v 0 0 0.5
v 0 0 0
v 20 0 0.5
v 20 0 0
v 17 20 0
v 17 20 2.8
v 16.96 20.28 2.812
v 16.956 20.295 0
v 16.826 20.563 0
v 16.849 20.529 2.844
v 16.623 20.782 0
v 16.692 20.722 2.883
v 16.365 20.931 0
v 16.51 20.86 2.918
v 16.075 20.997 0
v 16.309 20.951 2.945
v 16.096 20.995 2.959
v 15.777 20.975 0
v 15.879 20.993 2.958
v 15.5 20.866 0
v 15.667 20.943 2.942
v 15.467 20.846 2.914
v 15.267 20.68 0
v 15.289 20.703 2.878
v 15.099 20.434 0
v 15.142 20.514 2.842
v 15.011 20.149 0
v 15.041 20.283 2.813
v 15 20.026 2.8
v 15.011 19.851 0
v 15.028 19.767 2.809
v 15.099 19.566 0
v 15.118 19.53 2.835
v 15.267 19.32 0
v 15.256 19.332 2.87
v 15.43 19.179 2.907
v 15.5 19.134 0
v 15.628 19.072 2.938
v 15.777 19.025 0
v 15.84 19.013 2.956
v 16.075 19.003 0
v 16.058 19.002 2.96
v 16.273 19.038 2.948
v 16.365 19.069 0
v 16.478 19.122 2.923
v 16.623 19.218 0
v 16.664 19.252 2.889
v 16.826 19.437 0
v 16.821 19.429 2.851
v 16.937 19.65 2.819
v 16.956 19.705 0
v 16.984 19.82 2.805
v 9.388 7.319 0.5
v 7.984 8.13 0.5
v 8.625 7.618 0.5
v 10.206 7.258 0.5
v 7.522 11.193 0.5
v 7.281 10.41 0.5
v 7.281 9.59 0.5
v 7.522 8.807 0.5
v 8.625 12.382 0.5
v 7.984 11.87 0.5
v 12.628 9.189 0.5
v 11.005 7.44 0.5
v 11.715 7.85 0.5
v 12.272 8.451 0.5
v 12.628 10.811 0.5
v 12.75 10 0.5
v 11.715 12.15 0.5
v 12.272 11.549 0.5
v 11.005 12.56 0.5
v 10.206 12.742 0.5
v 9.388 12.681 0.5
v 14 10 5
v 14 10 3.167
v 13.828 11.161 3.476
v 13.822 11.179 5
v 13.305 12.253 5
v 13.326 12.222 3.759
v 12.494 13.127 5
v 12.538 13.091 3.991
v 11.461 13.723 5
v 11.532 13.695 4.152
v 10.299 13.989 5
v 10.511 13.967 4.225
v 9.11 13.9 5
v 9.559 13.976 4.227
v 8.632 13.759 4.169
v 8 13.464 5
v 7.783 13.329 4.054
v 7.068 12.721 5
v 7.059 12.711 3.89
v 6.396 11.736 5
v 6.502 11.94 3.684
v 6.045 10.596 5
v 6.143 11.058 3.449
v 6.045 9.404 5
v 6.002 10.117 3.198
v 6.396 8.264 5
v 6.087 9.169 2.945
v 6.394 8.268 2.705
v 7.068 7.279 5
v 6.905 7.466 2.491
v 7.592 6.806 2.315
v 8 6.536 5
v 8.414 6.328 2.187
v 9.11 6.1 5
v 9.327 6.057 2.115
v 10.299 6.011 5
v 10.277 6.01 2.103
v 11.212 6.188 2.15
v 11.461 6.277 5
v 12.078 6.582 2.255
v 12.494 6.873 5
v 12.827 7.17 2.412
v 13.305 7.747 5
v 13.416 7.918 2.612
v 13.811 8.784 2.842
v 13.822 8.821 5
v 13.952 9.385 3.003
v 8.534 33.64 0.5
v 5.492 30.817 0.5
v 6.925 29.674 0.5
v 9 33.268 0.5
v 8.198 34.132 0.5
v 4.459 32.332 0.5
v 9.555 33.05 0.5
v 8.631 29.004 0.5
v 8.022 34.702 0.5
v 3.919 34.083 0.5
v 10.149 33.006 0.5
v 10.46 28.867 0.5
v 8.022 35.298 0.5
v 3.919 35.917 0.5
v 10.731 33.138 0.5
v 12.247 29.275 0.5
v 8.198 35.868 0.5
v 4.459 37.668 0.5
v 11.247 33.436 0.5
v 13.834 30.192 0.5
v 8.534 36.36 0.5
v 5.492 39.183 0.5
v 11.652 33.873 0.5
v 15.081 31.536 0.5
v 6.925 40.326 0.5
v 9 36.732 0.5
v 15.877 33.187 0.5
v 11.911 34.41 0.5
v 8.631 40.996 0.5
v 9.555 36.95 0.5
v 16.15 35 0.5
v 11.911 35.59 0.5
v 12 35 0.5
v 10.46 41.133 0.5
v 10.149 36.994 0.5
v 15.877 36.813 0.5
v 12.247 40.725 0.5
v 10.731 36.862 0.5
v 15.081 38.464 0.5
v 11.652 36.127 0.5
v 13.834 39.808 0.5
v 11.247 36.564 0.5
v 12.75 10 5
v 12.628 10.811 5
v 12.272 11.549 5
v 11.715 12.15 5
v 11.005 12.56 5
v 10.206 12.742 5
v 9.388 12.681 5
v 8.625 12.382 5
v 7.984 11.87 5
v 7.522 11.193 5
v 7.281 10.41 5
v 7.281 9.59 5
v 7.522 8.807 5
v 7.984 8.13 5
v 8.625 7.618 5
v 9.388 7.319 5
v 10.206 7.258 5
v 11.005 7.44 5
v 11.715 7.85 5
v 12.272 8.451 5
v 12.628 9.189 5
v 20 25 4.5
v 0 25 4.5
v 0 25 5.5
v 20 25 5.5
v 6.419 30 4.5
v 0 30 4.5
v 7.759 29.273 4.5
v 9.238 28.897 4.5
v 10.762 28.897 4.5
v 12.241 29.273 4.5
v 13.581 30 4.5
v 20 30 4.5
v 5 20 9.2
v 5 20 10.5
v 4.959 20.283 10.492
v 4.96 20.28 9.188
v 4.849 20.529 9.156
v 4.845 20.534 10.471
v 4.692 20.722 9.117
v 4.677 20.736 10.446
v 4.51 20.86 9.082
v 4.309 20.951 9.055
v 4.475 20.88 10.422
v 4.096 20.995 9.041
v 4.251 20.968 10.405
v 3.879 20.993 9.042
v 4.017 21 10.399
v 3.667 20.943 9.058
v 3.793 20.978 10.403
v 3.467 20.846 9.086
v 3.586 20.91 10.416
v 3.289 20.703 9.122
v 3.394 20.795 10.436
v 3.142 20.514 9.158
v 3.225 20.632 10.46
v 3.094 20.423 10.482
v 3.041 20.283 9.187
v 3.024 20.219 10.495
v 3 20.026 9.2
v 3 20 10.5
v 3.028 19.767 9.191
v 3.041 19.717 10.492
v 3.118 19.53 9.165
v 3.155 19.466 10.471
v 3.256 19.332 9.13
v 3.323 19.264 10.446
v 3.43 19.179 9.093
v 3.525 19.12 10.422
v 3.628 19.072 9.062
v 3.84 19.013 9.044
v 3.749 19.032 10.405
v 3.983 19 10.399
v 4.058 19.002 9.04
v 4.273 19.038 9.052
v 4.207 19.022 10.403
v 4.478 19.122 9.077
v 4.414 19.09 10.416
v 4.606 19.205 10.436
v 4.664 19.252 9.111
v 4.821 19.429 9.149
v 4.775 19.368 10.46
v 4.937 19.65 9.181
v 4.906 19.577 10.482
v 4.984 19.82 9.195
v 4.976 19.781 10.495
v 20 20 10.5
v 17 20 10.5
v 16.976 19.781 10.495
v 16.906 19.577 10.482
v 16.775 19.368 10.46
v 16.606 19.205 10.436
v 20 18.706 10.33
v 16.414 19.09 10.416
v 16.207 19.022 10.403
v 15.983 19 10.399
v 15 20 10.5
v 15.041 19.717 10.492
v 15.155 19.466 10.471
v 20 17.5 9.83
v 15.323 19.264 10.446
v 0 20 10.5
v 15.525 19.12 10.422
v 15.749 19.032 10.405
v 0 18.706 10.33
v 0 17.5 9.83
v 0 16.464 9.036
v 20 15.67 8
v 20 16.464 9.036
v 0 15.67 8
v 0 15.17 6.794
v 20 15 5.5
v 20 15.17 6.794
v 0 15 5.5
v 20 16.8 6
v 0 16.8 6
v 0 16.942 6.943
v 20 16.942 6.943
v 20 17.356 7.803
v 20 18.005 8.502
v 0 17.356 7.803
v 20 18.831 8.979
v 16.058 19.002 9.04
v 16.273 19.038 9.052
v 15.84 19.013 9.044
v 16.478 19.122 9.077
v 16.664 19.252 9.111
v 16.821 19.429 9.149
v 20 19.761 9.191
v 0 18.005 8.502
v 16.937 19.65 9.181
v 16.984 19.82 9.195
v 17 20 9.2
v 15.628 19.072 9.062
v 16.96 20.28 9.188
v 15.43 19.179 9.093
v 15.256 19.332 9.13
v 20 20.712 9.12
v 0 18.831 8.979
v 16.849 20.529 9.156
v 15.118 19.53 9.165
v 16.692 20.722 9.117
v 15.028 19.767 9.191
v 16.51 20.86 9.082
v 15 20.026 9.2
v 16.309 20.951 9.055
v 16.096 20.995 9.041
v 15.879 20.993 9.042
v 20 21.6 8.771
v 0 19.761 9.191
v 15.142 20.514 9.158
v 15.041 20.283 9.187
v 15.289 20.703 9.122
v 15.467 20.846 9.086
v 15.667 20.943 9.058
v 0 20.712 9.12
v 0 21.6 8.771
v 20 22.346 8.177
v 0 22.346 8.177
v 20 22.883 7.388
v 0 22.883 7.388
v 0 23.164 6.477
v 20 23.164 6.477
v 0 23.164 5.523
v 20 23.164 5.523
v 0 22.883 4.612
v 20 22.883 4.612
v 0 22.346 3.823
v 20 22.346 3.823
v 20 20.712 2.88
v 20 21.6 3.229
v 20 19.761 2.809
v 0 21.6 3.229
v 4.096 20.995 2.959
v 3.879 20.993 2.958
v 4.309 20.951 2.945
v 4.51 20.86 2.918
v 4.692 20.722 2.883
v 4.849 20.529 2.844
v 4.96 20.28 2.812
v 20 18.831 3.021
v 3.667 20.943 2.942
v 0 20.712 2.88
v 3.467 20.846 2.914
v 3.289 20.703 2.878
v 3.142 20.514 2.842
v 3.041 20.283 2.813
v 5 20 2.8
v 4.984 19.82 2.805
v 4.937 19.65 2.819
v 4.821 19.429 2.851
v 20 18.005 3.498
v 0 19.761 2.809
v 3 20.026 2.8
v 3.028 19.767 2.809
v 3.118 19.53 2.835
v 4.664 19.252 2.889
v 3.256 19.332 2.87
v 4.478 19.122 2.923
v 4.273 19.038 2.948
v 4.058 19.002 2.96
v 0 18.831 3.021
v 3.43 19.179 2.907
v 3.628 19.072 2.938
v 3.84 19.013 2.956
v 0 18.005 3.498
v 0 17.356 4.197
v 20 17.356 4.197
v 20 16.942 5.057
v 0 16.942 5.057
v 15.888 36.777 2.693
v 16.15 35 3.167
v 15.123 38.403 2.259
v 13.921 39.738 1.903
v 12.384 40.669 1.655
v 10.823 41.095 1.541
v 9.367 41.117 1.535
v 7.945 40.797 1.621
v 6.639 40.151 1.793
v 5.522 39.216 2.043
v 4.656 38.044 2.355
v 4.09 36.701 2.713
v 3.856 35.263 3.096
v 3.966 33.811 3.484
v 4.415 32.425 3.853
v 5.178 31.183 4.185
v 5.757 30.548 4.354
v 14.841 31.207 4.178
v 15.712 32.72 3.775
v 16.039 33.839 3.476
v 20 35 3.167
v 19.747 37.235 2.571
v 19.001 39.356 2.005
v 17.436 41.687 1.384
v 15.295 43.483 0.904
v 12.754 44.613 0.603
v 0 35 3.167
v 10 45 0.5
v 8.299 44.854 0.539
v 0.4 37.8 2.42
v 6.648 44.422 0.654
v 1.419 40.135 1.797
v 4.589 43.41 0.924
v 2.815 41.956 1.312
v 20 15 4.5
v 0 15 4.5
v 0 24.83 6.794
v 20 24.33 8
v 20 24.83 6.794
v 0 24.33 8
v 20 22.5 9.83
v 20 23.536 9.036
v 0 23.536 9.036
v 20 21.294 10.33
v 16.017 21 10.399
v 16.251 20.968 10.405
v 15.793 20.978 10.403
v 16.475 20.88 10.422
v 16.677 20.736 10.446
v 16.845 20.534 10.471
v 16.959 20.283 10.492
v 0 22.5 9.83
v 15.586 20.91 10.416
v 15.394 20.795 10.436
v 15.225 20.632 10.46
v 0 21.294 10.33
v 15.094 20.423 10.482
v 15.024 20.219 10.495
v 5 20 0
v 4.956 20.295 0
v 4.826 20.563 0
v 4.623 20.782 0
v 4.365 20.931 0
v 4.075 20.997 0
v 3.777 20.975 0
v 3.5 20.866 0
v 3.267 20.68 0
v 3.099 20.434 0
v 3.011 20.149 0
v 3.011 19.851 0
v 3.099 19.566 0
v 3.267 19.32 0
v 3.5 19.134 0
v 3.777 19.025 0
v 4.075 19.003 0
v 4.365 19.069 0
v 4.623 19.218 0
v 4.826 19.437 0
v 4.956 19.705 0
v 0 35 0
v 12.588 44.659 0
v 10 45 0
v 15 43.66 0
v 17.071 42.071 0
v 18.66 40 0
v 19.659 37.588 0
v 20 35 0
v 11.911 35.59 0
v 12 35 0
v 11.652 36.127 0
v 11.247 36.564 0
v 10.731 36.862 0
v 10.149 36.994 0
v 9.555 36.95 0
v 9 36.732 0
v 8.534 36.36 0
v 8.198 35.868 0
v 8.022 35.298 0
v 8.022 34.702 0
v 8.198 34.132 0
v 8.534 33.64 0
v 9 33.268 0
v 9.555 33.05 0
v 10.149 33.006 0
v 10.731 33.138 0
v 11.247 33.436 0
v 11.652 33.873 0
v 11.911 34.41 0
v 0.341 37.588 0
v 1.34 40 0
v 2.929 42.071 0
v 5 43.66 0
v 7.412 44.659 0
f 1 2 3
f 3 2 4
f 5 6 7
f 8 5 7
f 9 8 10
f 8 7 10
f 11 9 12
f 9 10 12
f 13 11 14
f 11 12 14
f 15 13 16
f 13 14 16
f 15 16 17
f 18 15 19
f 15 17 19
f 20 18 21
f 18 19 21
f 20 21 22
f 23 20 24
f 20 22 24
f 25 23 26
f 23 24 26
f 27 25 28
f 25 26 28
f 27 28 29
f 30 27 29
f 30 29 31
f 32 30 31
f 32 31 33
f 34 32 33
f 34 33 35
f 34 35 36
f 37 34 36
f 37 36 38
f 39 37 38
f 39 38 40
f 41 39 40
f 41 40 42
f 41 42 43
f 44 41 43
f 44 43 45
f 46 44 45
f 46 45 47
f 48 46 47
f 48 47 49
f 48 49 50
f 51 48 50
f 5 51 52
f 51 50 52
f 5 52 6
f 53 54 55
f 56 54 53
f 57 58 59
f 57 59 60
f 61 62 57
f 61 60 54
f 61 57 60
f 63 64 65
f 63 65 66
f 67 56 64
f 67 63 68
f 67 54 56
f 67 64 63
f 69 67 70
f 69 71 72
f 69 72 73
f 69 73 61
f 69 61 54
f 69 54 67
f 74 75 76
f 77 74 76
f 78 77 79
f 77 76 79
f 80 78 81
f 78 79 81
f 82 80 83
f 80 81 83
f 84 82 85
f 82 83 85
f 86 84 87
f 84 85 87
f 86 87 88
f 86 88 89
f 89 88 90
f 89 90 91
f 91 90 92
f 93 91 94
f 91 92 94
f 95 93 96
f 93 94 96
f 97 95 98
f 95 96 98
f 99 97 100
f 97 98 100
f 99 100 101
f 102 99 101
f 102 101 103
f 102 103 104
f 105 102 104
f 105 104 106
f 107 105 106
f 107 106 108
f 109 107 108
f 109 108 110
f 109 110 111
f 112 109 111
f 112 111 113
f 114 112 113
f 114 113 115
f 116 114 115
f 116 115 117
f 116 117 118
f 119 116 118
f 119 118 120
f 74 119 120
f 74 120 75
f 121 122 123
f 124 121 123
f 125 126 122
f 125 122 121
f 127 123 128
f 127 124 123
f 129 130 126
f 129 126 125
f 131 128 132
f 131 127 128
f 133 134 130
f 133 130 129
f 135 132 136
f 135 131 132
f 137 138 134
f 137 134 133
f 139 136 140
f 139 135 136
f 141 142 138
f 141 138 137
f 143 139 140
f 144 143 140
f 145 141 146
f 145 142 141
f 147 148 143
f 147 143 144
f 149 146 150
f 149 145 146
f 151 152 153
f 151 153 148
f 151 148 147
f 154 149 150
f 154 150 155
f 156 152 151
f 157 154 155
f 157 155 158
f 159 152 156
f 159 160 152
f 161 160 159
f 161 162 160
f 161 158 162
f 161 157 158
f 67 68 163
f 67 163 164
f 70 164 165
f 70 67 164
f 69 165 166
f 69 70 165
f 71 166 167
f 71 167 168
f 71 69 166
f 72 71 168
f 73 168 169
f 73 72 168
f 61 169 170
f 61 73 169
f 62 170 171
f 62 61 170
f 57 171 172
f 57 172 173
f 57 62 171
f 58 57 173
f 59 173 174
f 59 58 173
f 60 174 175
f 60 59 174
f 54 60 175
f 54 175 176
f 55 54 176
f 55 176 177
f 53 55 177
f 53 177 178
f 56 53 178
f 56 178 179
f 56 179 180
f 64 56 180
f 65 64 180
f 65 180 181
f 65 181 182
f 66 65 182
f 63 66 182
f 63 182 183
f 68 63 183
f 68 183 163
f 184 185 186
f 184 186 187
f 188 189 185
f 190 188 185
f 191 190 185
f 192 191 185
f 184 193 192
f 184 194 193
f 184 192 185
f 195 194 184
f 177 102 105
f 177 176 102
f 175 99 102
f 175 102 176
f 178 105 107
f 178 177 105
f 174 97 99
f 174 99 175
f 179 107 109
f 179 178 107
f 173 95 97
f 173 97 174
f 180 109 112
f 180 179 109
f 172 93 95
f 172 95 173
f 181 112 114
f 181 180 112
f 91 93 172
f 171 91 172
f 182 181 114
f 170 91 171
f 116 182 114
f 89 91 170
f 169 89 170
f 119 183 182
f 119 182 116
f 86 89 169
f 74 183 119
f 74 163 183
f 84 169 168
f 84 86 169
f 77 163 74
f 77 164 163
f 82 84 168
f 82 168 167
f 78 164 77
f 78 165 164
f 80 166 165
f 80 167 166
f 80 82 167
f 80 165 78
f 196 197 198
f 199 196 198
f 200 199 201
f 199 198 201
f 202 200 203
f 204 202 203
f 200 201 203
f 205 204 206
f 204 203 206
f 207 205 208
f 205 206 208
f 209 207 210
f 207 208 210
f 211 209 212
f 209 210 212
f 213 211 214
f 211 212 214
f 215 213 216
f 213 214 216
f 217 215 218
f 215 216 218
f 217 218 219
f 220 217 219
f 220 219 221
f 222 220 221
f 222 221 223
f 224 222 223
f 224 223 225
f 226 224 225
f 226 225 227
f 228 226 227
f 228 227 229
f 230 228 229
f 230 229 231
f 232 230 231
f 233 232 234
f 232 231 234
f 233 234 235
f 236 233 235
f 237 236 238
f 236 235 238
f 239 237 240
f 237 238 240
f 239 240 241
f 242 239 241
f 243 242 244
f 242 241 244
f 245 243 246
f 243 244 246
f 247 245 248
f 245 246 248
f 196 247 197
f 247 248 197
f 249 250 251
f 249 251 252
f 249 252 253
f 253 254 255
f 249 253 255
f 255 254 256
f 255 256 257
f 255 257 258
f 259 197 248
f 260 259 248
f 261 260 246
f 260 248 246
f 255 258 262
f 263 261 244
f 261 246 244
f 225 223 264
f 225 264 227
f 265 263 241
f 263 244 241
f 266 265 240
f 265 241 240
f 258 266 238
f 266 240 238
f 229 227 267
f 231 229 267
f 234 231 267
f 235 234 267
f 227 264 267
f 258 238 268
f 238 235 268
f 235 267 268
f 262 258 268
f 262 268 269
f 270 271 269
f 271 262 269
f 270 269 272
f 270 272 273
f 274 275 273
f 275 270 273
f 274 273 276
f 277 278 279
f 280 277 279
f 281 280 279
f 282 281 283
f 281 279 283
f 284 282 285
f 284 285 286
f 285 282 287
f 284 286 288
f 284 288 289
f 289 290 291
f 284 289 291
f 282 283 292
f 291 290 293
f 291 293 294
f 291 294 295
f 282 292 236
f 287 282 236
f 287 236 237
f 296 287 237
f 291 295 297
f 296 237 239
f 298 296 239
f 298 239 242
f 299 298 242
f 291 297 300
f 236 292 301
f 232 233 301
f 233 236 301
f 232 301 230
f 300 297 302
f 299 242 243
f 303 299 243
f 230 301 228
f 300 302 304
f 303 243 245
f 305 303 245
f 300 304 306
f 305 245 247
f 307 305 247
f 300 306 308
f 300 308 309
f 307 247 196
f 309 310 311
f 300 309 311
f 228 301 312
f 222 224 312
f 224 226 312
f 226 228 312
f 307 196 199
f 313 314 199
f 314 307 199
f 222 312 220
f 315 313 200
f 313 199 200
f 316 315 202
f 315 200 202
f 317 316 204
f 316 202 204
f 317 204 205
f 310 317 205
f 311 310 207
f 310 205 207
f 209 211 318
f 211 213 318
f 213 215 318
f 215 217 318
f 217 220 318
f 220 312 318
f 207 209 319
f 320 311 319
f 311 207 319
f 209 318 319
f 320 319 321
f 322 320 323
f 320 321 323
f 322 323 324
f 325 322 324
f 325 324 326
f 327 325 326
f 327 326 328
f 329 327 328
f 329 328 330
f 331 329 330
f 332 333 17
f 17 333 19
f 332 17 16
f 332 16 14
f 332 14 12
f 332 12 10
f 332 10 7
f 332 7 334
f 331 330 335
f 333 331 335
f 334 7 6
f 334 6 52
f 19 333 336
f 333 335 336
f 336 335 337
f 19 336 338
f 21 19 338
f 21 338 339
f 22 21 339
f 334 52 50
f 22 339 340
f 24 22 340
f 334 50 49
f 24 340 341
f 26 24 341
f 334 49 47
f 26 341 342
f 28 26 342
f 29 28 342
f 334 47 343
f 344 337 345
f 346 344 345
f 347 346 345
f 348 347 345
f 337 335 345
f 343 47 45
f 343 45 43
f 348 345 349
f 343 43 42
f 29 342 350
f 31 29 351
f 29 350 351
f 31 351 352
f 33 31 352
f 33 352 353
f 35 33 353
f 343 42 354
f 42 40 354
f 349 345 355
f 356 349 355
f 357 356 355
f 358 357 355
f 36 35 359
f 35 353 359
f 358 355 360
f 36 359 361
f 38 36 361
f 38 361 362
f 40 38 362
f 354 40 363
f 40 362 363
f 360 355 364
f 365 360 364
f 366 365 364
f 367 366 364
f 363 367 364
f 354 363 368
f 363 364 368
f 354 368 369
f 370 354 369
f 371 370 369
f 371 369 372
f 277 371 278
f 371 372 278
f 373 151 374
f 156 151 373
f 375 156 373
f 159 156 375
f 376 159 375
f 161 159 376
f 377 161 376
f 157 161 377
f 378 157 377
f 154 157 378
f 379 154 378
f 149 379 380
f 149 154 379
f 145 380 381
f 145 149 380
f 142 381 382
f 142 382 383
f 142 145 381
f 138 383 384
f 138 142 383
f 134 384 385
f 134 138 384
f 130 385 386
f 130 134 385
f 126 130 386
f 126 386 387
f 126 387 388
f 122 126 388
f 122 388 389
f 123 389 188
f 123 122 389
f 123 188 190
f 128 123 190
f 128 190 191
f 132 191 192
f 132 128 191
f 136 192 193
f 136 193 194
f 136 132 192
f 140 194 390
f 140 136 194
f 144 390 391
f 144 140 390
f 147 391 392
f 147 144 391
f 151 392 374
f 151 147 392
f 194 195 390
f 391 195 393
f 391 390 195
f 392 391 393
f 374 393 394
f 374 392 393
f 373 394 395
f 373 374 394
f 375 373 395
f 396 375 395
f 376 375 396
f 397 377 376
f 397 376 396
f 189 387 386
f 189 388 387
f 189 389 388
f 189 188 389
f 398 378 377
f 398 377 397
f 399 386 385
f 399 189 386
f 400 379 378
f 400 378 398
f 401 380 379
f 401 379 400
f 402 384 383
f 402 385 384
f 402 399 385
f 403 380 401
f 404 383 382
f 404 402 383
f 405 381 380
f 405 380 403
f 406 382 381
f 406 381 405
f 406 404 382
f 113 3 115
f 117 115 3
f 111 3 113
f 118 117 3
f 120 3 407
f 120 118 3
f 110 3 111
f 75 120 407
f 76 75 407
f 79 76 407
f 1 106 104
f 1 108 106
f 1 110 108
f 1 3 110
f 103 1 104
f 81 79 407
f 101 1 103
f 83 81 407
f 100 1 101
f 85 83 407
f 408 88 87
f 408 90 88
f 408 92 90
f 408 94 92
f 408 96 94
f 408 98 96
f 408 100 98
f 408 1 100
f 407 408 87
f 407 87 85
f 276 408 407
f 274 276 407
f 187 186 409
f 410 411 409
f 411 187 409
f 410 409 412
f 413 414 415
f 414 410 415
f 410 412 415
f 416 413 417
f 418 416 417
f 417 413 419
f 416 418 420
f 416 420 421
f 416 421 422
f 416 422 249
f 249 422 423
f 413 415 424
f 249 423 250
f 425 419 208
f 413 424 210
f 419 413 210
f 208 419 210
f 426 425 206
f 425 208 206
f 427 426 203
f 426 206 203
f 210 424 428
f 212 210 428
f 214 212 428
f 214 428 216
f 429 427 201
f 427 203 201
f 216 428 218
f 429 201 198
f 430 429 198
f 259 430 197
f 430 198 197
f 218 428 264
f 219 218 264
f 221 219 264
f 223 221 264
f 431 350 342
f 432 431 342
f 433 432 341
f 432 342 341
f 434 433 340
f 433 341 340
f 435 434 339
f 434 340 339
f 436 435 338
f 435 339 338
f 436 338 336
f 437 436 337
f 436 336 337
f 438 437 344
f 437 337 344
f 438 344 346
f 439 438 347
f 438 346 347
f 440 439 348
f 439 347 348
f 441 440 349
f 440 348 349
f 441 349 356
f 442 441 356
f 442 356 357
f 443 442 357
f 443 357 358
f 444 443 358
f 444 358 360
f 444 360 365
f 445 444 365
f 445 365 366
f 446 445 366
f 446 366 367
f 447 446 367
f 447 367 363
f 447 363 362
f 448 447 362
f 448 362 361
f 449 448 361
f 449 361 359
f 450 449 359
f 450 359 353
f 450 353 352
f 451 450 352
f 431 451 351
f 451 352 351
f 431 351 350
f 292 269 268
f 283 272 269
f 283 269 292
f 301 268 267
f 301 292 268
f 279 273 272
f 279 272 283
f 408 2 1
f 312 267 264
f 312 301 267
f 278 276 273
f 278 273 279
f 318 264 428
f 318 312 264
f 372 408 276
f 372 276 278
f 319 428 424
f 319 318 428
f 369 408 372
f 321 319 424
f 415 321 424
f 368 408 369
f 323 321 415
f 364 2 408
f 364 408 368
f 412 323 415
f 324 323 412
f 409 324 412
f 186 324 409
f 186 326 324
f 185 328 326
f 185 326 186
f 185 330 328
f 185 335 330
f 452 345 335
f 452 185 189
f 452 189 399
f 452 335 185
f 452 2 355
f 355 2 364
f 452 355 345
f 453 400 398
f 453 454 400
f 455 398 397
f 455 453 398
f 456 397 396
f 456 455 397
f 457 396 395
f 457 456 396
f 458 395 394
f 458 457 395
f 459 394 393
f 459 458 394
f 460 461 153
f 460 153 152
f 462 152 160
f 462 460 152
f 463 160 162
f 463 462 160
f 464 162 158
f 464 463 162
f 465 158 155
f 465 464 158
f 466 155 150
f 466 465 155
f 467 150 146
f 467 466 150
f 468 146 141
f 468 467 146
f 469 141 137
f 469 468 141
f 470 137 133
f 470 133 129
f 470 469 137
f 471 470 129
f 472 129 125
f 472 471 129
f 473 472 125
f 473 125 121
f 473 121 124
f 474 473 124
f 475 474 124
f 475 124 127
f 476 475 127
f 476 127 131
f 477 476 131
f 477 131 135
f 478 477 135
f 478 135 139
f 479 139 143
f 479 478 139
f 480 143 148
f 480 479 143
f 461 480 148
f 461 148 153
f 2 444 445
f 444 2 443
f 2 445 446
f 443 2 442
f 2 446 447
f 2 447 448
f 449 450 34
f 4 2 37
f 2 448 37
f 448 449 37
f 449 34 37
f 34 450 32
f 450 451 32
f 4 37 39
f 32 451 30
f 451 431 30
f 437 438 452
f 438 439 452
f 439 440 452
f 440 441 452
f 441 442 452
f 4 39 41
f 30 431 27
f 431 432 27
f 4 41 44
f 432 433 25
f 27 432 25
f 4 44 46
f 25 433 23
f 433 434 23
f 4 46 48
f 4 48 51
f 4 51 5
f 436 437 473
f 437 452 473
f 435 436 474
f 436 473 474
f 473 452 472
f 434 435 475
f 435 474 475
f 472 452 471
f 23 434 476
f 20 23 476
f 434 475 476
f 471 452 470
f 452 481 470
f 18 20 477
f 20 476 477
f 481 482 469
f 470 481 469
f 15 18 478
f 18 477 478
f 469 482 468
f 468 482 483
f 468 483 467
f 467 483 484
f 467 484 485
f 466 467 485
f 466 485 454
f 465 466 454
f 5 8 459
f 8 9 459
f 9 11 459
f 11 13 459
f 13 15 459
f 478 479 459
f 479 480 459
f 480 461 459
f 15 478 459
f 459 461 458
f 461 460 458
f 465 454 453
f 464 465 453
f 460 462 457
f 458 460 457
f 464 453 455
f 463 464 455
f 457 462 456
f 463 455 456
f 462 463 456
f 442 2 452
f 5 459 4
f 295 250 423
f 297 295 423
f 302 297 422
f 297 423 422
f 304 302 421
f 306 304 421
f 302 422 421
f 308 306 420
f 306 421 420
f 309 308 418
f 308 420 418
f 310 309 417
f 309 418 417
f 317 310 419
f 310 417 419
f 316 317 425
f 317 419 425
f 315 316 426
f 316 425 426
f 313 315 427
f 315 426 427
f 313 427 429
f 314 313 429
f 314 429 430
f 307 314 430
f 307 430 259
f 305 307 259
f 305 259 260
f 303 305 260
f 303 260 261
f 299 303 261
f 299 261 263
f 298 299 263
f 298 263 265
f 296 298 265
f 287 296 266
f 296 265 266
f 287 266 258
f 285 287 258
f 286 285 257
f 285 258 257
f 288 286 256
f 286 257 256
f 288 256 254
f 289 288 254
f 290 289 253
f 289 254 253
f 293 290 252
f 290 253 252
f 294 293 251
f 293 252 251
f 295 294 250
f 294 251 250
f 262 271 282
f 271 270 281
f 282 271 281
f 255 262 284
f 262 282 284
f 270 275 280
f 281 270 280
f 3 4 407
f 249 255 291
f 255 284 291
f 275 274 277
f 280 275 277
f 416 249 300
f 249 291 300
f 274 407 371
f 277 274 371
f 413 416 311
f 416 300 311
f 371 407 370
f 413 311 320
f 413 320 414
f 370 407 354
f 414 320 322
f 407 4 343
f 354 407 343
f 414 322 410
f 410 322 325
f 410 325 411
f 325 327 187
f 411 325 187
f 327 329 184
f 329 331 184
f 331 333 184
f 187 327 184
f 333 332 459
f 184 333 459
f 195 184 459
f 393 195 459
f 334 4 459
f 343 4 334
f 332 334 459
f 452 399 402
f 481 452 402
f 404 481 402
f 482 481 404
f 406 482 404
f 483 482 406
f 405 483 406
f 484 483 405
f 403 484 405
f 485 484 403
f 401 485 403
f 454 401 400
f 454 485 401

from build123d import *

# Parameters (mm, degrees)
F0_W         = 20
F0_H         = 45
F0_R         = 4
F0_R_2       = 6.15
F1_DEPTH     = 4
F1_FACE_W    = 20
F1_FACE_H    = 45
F1_FACE_R    = 4
F1_FACE_R_2  = 6.15
F0_R_3       = 2
F0_R_4       = 2.75
F2_DEPTH     = 0.5
F4_T1_DEPTH  = 97.9025398997
F5_DEPTH     = 5
F3_W         = 20
F3_H         = 10
F6_DEPTH     = 6
F7_R         = 3.2
F8_DEPTH     = 25
F10_R        = 9.99999
F11_R        = 1
F12_DEPTH    = 25
F13_T1_DEPTH = 45


# Not quite as in the source:
# - a fillet or chamfer that OpenCascade refuses, or shapes differently, is made with other operations: its cross-section is extruded or revolved along the edge and cut away or added
# - a fillet or chamfer is up to 0.001 mm smaller than in the source, because OpenCascade refuses the exact size
# - a feature of the source that left no trace in its solid (it failed there, or was rolled back) is left out


with BuildPart() as f1:
    # F0 (on Top) → F1 (new body)
    with BuildSketch(Plane.XY):
        with Locations((10, 22.5)):
            Rectangle(F0_W, F0_H)
        with Locations((10, 10)):
            Circle(F0_R, mode=Mode.SUBTRACT)
        with Locations((10, 35)):
            Circle(F0_R_2, mode=Mode.SUBTRACT)
    extrude(amount=F1_DEPTH)

    # F1_face (on face) + F0 (on Top) → F2 (join)
    with BuildSketch(Plane(origin=(10, 21.3275360022, 4), x_dir=(1, 0, 0), z_dir=(0, 0, 1))):
        with Locations((0, 1.1724639978)):
            Rectangle(F1_FACE_W, F1_FACE_H)
        with Locations((0, -11.3275360022)):
            Circle(F1_FACE_R, mode=Mode.SUBTRACT)
        with Locations((0, 13.6724639978)):
            Circle(F1_FACE_R_2, mode=Mode.SUBTRACT)
    with BuildSketch(Plane.XY):
        with Locations((10, 35)):
            Circle(F0_R_2)
        with Locations((10, 35)):
            Circle(F0_R_3, mode=Mode.SUBTRACT)
        with Locations((10, 10)):
            Circle(F0_R_4)
    extrude(amount=F2_DEPTH)

    # F4: chamfer of 15 x 4 on 2 edges, made by hand

    # F4_s2 → F4_t1 (cut)
    with BuildSketch(Plane.YZ.offset(-38.9512699498)):
        Polygon((0, 0.5), (15, 4.5), (0, 4.5), align=None)
        Polygon((30, 4.5), (45, 0.5), (45, 4.5), align=None)
    extrude(amount=F4_T1_DEPTH, mode=Mode.SUBTRACT)

    # F0 (on Top) → F5 (join)
    with BuildSketch(Plane.XY):
        with Locations((10, 10)):
            Circle(F0_R)
        with Locations((10, 10)):
            Circle(F0_R_4, mode=Mode.SUBTRACT)
    extrude(amount=F5_DEPTH)

    # F3 (on face) → F6 (join)
    with BuildSketch(Plane.XY.offset(4.5)):
        with Locations((10, 20)):
            Rectangle(F3_W, F3_H)
    extrude(amount=F6_DEPTH)

    # F7 (on face) → F8 (cut)
    with BuildSketch(Plane(origin=(0, 0, 0), x_dir=(0, -1, 0), z_dir=(-1, 0, 0))):
        with Locations((-20, 6)):
            Circle(F7_R)
    extrude(amount=-F8_DEPTH, mode=Mode.SUBTRACT)

    # F10 (radius 10 in the source; OpenCascade refuses exactly that, so slightly less here)
    f10_edges = [f1.edges().sort_by_distance(p)[0] for p in [
        (0, 45, 0.25),
        (20, 45, 0.25),
    ]]
    fillet(f10_edges, radius=F10_R)

    # F11 (on face) → F12 (cut)
    with BuildSketch(Plane.XY.offset(10.5)):
        with Locations((4, 20)):
            Circle(F11_R)
        with Locations((16, 20)):
            Circle(F11_R)
    extrude(amount=-F12_DEPTH, mode=Mode.SUBTRACT)

    # F13: fillet of radius 5 on 2 edges, made by hand

    # F13_s2 → F13_t1 (cut)
    with BuildSketch(Plane.YZ.offset(-12.5)):
        with BuildLine():
            ThreePointArc((25, 5.5), (23.5355339059, 9.0355339059), (20, 10.5))
            Line((20, 10.5), (25, 10.5))
            Line((25, 10.5), (25, 5.5))
        make_face()
        with BuildLine():
            ThreePointArc((20, 10.5), (16.4644660941, 9.0355339059), (15, 5.5))
            Line((15, 5.5), (15, 10.5))
            Line((15, 10.5), (20, 10.5))
        make_face()
    extrude(amount=F13_T1_DEPTH, mode=Mode.SUBTRACT)


solid = f1.part
